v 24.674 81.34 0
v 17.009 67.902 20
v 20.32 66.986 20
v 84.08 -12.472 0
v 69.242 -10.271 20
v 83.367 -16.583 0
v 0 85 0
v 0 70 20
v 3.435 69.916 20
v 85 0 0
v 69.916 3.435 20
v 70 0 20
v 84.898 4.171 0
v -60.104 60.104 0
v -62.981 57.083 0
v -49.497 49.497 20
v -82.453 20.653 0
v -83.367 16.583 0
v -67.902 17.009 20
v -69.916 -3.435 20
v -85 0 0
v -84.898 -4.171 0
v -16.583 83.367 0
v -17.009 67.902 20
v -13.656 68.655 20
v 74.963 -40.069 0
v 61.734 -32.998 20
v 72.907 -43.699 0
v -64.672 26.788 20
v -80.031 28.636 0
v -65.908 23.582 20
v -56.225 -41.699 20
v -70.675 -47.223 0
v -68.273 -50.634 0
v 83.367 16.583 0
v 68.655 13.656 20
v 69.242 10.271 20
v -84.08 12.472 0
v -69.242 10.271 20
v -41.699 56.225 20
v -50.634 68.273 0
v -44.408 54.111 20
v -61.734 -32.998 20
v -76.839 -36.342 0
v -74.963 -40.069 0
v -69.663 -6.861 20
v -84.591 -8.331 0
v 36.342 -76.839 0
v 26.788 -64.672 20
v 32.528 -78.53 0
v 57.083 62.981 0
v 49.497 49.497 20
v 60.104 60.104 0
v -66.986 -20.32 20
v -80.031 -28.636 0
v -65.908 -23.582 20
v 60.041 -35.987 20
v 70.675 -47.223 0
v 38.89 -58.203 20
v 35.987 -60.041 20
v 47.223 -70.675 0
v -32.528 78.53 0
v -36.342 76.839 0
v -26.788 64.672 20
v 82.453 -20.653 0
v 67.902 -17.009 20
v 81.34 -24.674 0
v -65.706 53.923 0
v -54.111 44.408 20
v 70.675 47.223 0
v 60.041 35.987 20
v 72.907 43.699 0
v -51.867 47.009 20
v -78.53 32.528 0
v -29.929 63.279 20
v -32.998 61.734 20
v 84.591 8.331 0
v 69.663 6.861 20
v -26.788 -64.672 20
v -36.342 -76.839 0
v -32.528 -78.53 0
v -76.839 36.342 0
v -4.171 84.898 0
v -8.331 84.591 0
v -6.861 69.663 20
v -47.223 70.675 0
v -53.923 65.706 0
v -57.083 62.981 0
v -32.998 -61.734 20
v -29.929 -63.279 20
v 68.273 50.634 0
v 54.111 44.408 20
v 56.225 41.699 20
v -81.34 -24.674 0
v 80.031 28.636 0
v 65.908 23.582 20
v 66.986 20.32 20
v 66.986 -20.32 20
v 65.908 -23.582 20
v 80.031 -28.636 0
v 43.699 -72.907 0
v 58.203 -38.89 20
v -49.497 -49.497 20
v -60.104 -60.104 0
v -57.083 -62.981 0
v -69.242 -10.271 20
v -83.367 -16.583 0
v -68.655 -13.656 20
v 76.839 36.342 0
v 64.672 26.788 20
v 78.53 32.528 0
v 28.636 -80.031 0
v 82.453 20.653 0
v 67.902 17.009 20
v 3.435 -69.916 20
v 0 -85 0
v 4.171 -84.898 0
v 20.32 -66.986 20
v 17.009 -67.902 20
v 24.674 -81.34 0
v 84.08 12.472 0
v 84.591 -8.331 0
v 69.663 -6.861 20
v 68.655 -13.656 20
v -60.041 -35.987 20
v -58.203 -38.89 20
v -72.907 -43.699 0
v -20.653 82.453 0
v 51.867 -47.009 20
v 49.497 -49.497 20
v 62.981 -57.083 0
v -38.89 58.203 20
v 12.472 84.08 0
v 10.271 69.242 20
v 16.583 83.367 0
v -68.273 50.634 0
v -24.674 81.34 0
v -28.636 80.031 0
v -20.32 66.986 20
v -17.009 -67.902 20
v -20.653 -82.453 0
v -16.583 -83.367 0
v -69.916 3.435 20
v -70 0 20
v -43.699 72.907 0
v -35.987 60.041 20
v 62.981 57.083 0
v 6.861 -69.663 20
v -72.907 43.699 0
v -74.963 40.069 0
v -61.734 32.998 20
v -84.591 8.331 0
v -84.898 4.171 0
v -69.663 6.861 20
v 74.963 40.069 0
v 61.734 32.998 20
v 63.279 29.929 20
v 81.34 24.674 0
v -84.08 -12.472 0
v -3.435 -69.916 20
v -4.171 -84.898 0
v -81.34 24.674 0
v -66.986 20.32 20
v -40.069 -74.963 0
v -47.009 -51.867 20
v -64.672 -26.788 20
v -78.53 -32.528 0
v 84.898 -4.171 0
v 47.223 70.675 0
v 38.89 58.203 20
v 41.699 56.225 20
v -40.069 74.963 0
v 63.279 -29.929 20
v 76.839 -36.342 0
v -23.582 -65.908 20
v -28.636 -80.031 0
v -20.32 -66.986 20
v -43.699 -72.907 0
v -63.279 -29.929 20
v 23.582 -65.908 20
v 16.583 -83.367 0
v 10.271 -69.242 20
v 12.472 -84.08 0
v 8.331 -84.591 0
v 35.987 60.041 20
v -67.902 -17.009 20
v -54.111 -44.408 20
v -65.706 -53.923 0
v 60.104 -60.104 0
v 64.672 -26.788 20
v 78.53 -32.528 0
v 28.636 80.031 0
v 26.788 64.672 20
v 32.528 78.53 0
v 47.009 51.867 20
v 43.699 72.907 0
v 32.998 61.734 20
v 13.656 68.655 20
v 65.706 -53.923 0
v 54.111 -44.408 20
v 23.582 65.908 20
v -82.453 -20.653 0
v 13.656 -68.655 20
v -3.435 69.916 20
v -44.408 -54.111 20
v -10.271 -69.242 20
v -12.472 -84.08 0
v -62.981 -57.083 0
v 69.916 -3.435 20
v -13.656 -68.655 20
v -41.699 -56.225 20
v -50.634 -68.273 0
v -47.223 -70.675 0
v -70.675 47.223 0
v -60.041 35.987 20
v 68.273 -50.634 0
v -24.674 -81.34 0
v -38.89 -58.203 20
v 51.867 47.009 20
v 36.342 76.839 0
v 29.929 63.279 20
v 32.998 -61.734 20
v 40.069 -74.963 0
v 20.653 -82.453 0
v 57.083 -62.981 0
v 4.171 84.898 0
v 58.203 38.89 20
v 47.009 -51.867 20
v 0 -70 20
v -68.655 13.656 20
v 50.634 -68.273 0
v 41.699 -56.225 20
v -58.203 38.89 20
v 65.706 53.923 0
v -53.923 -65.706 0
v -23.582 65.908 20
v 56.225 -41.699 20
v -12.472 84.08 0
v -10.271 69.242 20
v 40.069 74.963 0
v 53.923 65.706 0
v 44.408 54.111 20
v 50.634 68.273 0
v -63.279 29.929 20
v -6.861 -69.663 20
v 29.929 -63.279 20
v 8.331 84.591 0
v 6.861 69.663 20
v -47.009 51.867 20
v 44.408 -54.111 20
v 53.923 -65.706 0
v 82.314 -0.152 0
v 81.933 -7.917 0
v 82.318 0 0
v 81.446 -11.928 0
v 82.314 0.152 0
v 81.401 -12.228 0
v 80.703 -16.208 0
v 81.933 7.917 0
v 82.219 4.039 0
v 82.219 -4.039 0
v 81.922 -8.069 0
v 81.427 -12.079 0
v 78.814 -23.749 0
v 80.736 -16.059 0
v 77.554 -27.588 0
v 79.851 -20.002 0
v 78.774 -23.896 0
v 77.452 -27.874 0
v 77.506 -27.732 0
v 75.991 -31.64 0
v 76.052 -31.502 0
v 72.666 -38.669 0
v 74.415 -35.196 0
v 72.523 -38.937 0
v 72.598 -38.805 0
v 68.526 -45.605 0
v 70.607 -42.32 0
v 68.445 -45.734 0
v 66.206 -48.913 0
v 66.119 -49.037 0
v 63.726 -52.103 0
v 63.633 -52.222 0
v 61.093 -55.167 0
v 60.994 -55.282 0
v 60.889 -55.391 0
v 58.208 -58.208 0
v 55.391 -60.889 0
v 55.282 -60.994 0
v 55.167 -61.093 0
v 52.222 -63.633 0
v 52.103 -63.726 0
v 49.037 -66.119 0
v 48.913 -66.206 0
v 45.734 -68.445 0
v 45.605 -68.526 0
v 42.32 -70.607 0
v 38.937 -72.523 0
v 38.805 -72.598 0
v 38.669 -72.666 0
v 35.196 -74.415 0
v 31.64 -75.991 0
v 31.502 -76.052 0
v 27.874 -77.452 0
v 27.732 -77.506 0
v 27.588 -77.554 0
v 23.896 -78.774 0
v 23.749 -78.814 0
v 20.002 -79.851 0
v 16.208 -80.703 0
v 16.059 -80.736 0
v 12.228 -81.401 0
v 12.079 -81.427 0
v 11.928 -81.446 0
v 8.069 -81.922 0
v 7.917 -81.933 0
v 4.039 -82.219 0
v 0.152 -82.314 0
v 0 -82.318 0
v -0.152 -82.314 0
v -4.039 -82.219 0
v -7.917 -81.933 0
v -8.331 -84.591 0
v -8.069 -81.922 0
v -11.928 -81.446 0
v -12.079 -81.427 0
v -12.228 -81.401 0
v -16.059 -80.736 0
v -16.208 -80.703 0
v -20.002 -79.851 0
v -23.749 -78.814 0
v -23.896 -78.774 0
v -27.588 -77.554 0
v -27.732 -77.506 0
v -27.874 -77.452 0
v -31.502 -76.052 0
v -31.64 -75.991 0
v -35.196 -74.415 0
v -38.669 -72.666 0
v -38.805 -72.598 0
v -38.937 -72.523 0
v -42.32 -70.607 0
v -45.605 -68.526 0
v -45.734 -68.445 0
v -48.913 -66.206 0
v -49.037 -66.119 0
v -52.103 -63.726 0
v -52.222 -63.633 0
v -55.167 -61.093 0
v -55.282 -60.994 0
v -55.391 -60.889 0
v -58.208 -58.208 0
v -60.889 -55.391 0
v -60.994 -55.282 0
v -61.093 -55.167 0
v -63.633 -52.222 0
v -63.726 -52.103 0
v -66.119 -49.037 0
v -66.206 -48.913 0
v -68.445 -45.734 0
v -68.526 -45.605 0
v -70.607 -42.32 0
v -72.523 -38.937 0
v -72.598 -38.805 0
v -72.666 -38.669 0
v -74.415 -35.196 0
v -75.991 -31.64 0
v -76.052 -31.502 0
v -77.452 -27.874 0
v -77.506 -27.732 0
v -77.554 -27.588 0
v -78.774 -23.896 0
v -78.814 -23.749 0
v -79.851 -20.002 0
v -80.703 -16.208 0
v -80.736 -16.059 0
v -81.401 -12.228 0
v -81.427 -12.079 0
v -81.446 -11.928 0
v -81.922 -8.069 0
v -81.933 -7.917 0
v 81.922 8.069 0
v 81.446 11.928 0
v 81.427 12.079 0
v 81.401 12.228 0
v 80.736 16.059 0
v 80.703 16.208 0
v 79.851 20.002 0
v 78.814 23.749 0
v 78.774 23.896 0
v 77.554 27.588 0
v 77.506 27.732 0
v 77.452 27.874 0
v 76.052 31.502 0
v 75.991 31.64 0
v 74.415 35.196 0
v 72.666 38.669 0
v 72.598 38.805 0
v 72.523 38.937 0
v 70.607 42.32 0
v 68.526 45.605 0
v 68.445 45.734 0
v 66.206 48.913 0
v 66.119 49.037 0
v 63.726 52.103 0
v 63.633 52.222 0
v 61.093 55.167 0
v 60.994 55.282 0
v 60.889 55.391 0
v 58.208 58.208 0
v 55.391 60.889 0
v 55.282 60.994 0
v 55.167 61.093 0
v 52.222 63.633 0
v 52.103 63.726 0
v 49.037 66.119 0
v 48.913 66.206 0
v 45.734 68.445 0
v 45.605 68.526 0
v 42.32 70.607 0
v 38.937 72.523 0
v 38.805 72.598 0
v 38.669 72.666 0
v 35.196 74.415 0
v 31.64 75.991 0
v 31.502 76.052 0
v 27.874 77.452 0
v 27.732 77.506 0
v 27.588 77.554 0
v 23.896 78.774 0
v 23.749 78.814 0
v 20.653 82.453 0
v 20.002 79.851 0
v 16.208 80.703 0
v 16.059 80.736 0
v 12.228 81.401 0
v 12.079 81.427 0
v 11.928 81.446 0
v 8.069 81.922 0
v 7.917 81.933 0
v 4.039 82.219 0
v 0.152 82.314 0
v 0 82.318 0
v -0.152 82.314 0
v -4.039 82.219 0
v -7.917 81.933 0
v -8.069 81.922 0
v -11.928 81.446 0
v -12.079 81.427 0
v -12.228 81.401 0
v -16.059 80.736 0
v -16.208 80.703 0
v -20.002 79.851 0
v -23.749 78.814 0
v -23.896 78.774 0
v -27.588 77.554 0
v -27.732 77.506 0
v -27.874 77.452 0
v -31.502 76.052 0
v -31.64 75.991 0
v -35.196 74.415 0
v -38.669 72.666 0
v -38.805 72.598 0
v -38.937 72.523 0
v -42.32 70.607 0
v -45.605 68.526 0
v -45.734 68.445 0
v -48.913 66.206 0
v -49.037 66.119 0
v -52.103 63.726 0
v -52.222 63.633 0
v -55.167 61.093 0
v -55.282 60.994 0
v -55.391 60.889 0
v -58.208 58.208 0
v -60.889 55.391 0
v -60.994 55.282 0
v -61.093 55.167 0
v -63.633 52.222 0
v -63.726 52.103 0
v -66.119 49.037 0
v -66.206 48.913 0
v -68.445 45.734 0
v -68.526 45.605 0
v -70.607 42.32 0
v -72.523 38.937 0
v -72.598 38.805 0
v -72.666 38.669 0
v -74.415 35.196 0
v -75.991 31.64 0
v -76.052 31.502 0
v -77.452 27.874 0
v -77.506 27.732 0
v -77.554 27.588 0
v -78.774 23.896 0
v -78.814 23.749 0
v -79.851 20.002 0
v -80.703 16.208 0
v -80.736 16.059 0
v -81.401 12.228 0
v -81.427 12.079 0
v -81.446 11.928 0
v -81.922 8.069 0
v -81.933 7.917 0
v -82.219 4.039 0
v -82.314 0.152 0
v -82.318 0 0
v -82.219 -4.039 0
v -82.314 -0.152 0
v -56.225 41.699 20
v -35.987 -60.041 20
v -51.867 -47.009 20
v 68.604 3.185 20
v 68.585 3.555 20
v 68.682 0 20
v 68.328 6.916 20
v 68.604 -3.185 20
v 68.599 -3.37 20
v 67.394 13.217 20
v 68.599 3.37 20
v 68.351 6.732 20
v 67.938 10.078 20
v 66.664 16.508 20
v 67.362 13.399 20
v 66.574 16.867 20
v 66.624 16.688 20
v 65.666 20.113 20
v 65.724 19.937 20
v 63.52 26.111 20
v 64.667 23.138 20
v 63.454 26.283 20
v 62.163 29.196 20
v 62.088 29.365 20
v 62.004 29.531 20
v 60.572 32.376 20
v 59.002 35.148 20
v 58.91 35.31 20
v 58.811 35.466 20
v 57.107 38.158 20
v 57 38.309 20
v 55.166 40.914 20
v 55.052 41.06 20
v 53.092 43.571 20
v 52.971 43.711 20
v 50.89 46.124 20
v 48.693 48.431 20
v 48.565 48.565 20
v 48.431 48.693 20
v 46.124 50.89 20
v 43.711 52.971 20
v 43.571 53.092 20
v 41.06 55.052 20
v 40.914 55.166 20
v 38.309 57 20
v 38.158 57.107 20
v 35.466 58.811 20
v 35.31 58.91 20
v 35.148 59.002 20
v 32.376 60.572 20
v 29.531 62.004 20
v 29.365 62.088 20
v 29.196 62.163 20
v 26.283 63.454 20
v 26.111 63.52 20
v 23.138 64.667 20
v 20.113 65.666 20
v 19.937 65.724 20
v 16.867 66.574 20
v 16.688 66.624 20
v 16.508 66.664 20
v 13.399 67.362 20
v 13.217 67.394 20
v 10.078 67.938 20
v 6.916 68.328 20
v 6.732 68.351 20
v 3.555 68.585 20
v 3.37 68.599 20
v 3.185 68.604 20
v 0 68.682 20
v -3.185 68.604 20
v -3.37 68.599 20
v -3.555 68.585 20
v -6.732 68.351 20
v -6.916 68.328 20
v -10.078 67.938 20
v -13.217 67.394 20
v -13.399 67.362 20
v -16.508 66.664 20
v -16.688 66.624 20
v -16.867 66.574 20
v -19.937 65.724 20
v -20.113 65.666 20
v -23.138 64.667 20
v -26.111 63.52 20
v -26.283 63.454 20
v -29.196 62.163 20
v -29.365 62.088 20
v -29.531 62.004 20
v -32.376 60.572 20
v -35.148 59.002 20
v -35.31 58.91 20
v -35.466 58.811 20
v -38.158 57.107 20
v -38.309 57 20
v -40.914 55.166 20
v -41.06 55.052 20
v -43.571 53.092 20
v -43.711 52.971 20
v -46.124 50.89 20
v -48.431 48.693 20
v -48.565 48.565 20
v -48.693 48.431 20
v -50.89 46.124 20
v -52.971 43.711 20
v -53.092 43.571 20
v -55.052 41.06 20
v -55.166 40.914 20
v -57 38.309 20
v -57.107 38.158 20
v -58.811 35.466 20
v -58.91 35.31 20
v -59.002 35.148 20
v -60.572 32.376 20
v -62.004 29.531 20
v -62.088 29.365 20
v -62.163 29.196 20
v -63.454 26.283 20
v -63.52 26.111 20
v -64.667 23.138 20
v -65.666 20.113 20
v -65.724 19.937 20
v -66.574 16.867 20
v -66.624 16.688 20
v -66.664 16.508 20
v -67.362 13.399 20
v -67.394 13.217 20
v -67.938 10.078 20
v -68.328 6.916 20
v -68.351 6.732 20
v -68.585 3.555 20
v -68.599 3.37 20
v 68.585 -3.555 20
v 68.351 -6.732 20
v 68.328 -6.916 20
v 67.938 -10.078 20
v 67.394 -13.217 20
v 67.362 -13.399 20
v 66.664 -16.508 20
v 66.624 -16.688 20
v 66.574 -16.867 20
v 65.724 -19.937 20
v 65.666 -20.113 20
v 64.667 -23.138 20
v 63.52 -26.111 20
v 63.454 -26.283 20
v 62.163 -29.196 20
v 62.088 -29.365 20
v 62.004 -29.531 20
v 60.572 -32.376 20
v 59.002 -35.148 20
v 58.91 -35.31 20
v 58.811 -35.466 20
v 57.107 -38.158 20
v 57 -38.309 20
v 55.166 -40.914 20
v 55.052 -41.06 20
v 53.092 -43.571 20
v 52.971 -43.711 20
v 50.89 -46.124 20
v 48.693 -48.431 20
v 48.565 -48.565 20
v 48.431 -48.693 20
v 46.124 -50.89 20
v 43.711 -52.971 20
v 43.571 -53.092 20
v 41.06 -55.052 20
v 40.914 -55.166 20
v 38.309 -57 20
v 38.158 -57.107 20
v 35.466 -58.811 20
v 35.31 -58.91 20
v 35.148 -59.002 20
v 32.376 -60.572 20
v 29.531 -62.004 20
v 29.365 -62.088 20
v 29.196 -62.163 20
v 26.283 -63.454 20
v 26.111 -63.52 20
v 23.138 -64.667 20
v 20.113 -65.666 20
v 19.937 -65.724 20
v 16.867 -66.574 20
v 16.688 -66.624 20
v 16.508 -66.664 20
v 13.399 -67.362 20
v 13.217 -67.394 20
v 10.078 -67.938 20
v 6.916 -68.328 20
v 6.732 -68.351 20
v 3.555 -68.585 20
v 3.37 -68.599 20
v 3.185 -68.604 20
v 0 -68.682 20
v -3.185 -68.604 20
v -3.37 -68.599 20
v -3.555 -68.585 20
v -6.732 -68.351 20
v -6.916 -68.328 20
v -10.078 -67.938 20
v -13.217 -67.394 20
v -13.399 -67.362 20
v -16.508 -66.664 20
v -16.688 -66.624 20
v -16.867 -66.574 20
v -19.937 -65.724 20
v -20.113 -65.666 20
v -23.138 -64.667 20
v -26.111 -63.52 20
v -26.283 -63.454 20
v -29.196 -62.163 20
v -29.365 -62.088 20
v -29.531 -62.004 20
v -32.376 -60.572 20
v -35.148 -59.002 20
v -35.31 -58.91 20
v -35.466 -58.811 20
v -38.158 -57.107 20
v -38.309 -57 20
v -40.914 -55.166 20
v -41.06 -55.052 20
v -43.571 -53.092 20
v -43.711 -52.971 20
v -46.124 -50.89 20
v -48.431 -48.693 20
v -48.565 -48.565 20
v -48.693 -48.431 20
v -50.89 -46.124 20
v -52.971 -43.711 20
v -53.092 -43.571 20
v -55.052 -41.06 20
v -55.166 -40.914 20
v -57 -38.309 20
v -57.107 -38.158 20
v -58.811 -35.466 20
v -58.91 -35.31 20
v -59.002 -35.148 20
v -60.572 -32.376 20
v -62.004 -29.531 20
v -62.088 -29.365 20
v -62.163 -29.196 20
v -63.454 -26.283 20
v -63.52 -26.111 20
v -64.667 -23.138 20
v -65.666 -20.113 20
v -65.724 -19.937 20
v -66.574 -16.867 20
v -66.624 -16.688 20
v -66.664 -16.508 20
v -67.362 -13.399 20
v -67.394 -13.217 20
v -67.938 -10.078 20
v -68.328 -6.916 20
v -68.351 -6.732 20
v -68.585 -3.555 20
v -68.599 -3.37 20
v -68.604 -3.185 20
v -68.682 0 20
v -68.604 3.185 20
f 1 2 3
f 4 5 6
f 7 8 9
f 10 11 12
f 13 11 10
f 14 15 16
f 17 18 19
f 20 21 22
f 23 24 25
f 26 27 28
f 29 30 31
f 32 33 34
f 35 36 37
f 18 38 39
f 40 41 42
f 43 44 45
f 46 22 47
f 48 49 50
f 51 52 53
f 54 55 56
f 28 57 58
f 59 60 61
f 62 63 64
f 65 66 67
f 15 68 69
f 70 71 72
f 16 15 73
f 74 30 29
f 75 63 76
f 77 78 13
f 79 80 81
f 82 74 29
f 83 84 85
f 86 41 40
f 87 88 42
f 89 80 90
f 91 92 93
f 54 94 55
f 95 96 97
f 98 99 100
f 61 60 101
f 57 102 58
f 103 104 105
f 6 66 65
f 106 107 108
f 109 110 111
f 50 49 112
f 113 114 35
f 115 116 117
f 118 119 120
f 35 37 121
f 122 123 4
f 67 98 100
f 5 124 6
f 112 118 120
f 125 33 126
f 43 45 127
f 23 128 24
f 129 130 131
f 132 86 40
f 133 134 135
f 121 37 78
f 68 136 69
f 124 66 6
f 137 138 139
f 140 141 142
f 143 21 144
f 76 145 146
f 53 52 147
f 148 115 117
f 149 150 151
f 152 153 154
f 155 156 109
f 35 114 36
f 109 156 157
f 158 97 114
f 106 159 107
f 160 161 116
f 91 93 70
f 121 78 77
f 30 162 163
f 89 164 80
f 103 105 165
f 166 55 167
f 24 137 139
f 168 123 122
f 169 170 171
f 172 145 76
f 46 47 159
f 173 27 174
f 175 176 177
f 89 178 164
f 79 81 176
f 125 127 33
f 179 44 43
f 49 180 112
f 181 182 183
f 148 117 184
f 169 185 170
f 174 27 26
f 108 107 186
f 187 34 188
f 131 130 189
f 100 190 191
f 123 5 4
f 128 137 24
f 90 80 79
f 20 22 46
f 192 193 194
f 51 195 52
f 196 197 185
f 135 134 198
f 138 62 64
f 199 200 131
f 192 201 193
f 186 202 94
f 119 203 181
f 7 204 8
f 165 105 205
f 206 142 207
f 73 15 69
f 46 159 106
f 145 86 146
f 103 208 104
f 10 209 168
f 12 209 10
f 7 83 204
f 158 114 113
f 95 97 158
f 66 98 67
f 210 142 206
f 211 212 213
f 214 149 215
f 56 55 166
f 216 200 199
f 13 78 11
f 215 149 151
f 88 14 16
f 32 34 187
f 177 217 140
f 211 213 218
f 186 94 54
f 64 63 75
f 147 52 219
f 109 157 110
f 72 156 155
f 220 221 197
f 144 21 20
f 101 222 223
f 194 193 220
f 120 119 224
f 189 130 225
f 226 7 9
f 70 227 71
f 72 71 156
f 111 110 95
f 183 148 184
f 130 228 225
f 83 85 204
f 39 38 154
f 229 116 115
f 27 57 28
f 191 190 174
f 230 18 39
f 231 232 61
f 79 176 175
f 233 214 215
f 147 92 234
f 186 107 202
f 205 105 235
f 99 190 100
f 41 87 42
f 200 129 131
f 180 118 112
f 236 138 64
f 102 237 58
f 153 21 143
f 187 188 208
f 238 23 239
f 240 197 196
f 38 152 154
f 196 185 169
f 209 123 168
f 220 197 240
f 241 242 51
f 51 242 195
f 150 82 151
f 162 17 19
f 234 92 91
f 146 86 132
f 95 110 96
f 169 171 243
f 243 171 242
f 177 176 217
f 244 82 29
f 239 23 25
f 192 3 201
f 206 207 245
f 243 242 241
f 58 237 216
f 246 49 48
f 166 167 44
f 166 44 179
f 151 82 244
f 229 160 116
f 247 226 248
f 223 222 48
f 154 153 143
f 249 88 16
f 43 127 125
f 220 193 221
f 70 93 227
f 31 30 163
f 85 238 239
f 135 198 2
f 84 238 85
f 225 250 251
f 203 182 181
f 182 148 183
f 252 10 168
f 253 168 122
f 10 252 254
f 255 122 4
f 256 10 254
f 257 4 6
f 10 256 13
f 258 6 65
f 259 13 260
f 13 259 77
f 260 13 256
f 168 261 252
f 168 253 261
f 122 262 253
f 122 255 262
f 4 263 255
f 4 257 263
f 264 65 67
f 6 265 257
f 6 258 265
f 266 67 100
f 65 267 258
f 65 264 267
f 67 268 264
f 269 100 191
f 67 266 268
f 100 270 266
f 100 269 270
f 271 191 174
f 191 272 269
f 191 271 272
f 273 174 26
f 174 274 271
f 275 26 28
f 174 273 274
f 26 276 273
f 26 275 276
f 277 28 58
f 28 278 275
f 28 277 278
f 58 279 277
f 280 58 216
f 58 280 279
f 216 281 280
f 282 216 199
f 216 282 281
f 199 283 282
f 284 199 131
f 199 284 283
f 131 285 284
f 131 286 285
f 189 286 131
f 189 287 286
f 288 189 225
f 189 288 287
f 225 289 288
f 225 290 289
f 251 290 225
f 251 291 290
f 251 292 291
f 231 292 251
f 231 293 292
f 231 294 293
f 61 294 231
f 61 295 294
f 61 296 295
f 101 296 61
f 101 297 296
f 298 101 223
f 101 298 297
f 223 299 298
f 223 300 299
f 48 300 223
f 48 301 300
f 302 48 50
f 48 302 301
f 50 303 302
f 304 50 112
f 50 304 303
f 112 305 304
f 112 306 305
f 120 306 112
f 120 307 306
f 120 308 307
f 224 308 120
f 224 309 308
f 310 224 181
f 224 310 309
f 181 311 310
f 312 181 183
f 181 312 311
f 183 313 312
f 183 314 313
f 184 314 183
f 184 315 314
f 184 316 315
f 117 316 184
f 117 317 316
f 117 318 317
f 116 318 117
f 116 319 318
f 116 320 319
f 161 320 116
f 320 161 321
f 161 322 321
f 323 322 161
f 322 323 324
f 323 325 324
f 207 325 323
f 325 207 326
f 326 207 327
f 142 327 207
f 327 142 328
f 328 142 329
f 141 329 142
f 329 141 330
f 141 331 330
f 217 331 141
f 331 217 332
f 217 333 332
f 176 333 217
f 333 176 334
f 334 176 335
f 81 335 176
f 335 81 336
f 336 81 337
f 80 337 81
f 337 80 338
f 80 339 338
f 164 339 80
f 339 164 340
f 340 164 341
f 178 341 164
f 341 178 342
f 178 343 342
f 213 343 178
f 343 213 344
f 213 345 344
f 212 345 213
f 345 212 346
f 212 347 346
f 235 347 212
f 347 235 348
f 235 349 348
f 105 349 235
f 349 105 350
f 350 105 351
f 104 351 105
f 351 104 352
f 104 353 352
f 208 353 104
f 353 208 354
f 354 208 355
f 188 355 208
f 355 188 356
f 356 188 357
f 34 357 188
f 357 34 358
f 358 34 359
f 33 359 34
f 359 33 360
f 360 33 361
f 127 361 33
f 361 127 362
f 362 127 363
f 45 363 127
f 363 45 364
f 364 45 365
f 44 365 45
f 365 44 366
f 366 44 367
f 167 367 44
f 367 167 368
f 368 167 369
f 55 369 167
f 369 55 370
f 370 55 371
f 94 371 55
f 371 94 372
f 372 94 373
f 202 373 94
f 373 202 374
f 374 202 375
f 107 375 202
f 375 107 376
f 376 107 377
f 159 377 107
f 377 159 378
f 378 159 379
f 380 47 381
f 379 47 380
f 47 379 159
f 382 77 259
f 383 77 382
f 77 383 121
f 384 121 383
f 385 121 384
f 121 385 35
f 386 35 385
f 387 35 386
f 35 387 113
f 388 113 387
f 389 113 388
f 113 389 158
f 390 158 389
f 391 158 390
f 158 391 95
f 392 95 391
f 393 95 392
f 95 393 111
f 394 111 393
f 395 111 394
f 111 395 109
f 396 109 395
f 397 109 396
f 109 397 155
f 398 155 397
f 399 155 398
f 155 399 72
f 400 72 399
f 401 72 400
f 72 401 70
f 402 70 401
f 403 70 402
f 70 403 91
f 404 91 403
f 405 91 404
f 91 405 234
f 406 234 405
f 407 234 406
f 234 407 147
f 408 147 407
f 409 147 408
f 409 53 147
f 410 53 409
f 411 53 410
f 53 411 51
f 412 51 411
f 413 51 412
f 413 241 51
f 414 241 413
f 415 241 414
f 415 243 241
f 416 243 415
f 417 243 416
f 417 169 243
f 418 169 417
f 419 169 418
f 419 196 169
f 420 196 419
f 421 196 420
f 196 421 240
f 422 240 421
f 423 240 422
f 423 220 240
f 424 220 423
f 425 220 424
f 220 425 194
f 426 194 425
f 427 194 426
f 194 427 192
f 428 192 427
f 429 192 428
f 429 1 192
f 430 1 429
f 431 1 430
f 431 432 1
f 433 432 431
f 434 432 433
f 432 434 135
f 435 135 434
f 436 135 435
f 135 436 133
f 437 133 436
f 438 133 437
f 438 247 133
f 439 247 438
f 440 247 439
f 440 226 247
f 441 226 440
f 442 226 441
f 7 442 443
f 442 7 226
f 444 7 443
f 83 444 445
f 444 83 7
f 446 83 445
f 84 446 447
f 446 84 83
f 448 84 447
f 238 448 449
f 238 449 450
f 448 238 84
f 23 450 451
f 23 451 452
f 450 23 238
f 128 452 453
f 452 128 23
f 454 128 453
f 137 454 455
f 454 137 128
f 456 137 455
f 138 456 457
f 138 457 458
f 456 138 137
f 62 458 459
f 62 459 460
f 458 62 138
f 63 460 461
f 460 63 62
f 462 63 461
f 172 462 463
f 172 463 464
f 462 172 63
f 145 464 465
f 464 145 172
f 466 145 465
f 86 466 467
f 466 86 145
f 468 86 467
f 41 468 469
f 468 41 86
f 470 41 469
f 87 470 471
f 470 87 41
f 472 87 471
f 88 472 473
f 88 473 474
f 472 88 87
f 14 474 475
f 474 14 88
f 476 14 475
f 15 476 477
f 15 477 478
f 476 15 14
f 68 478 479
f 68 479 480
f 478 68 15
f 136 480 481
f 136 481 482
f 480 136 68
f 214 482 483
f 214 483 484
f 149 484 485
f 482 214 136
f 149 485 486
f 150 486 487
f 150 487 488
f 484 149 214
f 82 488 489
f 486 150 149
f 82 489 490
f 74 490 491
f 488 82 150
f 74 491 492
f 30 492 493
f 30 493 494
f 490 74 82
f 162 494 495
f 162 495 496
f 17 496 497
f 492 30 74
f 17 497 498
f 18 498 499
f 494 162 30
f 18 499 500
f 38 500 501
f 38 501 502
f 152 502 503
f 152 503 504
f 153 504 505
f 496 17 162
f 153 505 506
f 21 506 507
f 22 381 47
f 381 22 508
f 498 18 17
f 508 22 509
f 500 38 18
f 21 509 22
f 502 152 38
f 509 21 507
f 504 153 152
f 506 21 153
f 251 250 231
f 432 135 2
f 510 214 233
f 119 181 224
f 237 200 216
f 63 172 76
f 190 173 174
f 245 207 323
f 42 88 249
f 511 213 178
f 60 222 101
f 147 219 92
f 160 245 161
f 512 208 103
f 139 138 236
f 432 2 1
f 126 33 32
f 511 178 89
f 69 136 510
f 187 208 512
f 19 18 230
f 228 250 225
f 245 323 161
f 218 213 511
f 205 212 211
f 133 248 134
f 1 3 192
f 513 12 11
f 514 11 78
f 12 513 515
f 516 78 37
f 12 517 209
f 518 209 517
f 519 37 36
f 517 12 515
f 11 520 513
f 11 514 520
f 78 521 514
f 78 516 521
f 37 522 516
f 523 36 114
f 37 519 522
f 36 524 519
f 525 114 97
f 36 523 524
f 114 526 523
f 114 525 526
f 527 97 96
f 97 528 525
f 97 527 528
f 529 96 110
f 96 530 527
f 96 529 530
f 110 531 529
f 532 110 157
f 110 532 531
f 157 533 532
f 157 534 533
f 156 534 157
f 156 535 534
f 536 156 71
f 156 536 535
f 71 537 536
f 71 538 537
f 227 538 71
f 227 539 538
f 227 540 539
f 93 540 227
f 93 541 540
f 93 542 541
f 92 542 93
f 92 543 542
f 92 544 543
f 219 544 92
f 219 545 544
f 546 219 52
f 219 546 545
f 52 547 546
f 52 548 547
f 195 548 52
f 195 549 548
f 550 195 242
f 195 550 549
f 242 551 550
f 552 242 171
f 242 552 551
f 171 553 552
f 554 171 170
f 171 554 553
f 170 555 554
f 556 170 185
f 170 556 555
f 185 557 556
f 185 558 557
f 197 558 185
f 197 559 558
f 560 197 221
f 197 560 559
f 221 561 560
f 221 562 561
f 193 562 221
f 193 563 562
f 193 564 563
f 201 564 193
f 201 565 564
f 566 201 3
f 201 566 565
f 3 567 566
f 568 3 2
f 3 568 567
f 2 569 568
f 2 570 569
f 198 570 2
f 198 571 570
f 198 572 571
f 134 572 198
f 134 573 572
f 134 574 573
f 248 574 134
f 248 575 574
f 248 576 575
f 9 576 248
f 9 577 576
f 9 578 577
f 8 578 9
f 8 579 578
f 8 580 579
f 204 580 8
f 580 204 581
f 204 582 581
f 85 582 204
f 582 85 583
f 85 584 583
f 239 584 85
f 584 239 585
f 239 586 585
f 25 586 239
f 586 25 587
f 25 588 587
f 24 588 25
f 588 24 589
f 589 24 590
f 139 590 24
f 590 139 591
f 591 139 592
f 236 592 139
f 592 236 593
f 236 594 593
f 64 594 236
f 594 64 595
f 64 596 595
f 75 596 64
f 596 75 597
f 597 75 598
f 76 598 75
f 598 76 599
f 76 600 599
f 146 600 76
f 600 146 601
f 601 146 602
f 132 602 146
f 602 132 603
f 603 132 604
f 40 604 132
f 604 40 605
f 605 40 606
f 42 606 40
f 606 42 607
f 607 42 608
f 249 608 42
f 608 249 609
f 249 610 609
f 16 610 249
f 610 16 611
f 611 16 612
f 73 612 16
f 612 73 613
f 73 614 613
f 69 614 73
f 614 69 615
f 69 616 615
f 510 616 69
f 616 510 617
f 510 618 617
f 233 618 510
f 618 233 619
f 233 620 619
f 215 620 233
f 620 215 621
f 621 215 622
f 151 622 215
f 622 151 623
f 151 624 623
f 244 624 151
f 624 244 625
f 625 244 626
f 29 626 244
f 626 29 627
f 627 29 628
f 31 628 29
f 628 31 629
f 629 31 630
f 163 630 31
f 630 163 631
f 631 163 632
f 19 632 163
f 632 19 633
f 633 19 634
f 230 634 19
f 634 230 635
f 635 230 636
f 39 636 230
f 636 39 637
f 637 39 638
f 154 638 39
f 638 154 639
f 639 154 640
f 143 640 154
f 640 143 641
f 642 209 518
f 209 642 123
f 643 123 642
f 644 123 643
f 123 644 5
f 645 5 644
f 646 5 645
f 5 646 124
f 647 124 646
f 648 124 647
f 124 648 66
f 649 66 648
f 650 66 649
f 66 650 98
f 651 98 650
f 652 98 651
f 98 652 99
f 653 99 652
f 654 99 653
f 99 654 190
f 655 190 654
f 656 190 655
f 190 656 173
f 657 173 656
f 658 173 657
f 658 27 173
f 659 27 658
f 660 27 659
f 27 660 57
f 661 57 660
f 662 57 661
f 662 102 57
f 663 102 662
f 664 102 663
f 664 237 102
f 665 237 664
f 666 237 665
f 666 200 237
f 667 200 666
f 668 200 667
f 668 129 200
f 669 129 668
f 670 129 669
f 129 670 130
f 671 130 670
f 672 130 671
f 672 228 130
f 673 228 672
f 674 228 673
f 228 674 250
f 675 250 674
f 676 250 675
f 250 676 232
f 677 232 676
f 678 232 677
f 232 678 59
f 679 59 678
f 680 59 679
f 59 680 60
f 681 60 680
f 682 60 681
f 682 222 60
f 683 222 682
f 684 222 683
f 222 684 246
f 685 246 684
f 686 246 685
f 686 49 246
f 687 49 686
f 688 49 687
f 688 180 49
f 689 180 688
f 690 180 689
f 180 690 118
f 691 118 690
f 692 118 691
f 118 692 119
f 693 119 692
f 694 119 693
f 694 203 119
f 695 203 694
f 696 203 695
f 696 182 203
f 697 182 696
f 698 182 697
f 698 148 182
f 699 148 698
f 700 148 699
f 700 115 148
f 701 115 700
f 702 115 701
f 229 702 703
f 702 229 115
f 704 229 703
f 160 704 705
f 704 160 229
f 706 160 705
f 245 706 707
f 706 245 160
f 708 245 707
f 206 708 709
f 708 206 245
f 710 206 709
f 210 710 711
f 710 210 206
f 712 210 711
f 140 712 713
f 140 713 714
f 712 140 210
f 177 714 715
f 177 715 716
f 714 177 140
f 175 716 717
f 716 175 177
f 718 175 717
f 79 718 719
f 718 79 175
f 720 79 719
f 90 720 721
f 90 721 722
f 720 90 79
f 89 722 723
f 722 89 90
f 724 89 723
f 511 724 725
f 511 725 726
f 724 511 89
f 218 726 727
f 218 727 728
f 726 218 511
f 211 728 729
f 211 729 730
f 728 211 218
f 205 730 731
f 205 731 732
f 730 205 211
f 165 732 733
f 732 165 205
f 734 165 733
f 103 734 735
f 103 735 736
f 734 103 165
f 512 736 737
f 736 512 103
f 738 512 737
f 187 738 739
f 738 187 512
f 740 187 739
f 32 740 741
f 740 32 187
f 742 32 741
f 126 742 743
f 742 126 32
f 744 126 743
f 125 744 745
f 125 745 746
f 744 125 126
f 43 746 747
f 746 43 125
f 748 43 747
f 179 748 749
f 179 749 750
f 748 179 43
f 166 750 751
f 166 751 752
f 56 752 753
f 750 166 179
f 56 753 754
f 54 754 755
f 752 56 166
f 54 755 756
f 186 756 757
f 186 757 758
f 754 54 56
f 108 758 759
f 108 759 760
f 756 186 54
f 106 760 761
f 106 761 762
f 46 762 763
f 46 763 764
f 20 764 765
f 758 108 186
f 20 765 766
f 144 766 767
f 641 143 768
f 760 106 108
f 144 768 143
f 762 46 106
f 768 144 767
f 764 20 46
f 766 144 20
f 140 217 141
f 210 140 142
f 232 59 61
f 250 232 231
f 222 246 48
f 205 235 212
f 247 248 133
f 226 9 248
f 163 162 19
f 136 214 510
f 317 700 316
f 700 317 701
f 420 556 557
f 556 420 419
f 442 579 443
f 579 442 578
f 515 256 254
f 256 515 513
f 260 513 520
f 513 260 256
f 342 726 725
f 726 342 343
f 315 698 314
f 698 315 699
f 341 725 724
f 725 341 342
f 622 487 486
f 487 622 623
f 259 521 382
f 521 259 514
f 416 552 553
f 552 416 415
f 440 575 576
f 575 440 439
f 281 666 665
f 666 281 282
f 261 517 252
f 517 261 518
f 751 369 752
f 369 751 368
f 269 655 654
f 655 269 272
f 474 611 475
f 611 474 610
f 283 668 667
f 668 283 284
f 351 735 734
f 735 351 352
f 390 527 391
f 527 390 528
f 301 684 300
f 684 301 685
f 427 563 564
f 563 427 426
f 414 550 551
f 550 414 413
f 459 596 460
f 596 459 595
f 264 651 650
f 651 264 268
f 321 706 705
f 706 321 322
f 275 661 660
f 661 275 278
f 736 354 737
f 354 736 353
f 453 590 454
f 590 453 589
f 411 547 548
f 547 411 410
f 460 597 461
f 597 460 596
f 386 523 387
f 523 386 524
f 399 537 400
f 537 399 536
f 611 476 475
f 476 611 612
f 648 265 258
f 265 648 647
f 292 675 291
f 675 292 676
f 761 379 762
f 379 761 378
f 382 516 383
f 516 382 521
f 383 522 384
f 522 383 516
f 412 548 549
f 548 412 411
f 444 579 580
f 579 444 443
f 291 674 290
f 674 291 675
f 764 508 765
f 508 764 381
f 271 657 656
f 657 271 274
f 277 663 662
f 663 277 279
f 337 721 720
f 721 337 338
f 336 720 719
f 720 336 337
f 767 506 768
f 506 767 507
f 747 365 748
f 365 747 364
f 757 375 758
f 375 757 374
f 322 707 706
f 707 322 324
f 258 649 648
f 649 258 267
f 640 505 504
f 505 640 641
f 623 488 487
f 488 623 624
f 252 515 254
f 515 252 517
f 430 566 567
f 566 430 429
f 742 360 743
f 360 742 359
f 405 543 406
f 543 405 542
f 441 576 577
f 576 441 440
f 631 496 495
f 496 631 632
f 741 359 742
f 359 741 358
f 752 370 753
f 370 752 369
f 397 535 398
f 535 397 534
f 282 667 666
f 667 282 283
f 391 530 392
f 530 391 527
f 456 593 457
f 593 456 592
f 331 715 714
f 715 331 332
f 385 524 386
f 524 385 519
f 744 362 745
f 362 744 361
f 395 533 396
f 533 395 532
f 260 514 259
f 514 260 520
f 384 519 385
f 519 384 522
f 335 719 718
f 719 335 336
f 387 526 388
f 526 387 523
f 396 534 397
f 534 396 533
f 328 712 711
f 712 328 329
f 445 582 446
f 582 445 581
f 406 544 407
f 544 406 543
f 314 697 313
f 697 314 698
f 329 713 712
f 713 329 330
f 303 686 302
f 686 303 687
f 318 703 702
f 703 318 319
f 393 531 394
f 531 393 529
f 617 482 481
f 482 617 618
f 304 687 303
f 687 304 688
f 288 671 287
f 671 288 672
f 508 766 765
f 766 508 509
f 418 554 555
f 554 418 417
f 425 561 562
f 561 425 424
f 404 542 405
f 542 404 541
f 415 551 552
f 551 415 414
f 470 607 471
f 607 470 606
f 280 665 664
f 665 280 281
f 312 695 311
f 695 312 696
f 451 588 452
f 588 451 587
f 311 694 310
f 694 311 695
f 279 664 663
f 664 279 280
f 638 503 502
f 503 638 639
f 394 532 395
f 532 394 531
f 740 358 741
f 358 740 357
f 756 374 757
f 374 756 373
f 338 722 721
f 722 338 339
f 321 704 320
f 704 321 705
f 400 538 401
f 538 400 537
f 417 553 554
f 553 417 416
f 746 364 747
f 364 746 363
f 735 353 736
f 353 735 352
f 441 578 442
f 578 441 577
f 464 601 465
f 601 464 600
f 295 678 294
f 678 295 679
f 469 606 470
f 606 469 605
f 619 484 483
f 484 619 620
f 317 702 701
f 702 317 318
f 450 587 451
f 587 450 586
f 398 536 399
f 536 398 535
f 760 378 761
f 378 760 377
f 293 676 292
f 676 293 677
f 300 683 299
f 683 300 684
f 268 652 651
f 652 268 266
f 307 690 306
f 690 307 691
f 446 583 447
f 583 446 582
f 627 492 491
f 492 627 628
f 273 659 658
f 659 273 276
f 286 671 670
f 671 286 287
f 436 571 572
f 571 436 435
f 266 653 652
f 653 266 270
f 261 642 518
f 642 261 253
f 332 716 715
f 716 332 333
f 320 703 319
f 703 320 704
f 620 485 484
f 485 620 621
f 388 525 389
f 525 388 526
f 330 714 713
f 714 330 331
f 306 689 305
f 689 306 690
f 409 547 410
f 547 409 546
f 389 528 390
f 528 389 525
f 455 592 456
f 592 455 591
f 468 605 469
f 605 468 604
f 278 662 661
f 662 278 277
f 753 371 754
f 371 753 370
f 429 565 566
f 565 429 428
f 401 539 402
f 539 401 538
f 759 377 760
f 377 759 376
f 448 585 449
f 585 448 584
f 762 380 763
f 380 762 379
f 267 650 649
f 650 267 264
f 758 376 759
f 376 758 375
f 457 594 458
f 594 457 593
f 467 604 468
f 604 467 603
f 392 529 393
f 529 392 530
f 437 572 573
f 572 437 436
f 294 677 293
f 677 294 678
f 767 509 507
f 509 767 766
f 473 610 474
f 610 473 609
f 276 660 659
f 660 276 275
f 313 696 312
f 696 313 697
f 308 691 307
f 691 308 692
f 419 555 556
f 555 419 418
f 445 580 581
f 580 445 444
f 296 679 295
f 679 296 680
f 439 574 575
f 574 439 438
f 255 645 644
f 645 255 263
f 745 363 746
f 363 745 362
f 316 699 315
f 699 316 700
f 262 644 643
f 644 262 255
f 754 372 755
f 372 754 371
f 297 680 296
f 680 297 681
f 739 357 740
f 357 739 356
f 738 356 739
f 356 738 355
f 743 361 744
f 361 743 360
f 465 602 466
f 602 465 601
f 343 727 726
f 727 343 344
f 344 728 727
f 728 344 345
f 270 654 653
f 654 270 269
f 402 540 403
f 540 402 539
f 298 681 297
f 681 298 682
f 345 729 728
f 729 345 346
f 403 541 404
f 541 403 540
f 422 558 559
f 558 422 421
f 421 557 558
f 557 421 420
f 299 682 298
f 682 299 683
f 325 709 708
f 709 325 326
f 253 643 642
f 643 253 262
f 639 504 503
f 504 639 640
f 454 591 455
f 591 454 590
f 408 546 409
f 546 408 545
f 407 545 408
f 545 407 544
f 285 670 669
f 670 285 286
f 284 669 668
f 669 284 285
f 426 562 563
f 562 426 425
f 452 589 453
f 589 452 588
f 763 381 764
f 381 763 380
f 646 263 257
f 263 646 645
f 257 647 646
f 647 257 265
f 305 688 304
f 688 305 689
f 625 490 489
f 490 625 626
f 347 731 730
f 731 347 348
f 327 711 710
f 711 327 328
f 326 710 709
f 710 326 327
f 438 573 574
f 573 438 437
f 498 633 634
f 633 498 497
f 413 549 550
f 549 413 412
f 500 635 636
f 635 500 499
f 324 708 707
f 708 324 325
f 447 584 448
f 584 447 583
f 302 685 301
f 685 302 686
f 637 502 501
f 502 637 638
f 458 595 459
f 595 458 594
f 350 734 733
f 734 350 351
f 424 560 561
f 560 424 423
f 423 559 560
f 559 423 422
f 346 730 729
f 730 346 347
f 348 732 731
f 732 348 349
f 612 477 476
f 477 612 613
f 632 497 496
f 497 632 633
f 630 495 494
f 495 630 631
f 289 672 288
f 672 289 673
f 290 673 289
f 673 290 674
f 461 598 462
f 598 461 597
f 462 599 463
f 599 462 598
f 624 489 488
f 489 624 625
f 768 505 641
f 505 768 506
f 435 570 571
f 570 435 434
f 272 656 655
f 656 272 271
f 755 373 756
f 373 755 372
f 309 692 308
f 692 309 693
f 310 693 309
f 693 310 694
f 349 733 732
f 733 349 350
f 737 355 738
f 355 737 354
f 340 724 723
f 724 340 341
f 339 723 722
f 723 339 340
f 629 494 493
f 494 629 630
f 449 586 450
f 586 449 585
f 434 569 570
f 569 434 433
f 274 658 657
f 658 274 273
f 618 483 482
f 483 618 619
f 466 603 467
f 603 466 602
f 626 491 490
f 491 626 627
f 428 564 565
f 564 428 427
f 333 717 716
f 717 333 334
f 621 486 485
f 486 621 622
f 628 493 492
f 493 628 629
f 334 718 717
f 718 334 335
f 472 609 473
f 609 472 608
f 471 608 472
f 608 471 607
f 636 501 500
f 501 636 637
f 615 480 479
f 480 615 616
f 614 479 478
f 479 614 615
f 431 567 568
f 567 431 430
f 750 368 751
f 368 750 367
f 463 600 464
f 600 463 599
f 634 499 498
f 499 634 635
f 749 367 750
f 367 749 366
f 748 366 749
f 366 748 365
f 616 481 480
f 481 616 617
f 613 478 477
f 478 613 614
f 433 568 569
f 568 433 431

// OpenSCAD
RING_DIA1 = 170;
RIND_DIA2 = 140;
difference() {
   cylinder(d1=RING_DIA1,d2=RIND_DIA2,h=20,$fn=128);
   translate([0,0,-1])
   cylinder(d1=RING_DIA1 - 4,d2=RIND_DIA2 - 4,h=22,$fn=128);
   }
